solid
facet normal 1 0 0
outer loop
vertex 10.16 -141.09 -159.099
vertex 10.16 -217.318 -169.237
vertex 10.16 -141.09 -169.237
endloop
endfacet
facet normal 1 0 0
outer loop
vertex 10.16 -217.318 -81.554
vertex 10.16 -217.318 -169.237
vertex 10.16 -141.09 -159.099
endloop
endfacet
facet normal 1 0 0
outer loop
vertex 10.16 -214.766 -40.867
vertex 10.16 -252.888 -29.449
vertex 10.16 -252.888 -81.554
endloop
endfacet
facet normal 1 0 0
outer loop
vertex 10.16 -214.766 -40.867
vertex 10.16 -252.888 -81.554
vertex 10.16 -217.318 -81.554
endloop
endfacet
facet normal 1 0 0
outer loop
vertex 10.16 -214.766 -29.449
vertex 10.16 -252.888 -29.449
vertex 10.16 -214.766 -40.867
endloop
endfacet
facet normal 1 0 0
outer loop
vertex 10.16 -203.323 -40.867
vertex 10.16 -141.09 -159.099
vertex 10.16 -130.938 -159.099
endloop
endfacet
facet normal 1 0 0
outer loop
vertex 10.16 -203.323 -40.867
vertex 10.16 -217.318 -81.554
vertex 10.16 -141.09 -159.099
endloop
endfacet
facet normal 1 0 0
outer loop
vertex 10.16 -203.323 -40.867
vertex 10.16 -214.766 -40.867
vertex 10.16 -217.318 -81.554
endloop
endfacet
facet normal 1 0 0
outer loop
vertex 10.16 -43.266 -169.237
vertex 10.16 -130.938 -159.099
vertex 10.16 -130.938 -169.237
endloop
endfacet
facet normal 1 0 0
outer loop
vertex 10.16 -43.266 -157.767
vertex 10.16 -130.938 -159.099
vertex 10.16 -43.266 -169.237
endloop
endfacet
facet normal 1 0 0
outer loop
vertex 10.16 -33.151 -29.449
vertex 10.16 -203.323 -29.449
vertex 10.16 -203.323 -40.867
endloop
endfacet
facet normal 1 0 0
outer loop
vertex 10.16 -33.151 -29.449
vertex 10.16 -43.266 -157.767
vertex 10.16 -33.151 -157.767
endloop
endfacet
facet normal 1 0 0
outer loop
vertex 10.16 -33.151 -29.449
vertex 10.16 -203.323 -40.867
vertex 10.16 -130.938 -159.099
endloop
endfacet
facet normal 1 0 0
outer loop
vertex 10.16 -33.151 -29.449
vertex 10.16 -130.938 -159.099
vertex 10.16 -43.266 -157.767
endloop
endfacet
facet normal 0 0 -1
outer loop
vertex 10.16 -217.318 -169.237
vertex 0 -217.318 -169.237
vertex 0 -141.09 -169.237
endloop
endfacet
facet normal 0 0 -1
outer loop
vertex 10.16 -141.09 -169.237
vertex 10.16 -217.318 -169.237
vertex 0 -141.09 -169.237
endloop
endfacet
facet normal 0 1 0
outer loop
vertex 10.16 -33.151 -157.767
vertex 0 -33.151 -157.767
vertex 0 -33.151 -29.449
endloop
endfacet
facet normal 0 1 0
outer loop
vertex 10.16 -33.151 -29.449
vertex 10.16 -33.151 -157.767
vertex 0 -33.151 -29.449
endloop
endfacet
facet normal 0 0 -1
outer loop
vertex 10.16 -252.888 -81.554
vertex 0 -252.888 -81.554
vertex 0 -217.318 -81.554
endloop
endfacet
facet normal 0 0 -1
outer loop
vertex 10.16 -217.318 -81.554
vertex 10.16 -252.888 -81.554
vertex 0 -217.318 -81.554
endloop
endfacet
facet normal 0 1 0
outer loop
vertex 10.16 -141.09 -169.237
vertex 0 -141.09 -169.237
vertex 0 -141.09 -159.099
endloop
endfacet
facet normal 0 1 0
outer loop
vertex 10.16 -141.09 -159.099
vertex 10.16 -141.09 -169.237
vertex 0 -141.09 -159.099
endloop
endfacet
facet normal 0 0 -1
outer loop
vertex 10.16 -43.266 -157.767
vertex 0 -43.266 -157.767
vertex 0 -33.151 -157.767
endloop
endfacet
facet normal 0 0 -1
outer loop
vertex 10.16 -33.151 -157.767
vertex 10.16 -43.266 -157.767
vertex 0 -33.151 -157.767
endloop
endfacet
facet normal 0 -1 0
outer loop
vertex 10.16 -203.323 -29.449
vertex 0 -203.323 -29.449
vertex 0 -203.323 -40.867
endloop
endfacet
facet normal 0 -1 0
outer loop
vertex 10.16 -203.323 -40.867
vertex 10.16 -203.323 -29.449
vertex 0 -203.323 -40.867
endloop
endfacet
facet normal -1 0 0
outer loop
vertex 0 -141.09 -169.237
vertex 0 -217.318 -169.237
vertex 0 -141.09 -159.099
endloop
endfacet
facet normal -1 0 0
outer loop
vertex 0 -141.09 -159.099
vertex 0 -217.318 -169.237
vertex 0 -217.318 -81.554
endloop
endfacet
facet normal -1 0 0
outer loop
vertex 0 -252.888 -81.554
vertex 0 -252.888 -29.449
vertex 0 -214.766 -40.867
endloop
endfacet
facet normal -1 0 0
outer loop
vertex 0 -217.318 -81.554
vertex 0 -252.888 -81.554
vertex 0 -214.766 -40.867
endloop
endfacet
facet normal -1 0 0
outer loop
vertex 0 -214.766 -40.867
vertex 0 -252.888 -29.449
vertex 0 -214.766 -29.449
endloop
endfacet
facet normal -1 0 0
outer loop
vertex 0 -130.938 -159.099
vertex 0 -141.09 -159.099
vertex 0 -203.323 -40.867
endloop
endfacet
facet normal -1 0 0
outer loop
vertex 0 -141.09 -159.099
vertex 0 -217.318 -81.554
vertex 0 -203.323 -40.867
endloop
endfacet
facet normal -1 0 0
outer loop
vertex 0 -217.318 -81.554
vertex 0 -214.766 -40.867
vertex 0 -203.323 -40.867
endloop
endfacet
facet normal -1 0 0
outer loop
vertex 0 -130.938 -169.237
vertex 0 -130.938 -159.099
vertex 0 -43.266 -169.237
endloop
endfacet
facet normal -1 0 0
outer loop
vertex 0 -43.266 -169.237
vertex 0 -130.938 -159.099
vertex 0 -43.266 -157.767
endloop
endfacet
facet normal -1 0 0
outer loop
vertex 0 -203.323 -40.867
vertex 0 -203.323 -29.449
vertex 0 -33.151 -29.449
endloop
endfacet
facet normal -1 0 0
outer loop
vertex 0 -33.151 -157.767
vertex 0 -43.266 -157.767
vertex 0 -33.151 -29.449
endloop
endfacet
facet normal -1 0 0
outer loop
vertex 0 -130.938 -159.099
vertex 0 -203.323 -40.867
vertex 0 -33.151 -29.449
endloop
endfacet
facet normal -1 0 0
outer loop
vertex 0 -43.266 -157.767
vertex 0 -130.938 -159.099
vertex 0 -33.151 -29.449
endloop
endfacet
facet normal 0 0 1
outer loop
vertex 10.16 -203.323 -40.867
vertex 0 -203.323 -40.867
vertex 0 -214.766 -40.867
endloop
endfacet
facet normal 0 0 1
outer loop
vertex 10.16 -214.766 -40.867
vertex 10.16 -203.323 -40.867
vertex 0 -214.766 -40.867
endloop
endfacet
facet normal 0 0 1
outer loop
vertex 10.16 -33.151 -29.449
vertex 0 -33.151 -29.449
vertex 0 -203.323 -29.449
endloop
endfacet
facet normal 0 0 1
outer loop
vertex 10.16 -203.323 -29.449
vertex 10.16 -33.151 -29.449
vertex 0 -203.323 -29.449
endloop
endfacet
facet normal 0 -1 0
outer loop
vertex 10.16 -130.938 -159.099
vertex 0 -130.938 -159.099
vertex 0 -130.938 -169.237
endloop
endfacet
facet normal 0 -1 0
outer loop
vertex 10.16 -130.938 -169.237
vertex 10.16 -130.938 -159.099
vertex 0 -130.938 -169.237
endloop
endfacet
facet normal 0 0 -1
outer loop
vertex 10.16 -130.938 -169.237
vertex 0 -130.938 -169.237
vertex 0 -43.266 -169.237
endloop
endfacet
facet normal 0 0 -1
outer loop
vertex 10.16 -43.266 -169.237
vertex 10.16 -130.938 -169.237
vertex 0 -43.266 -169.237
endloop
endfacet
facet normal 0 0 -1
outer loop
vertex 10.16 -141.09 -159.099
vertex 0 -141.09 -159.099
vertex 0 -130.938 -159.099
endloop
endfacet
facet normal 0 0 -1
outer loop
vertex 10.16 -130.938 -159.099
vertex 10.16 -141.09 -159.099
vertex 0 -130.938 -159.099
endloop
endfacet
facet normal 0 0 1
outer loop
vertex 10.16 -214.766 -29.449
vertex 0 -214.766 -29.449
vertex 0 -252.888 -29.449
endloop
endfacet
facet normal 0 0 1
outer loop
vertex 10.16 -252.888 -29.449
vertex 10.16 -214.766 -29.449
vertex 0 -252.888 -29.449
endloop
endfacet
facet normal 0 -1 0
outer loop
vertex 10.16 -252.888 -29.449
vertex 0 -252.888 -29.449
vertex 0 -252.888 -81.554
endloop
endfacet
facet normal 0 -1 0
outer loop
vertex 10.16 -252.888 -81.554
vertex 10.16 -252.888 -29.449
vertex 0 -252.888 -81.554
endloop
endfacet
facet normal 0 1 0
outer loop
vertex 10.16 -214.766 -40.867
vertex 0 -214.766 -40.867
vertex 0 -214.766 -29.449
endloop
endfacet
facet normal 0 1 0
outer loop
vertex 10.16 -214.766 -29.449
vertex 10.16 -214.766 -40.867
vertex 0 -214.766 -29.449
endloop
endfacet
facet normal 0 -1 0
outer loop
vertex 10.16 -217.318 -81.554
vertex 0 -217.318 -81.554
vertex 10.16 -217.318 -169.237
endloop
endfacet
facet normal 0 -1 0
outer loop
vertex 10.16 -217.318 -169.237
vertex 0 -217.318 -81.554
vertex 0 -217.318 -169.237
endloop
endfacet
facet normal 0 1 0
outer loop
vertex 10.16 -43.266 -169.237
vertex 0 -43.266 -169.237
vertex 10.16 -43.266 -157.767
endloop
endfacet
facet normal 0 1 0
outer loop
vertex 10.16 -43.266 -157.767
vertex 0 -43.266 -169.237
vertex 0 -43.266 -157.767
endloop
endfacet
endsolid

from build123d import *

# Parameters (mm, degrees)
F1_DEPTH = 10.16


with BuildPart() as f1:
    # F0 (on Right) → F1 (new body)
    with BuildSketch(Plane.YZ):
        Polygon((-33.151075, -29.448999), (-43.265525, -29.448999), (-203.323364, -29.448999), (-203.323364, -40.867418), (-214.765817, -40.867418), (-214.765817, -29.448999), (-252.887964, -29.448999), (-252.887964, -81.55378), (-217.317522, -81.55378), (-217.317522, -169.236988), (-141.089514, -169.236988), (-141.089514, -159.098729), (-130.937725, -159.098729), (-130.937725, -169.236988), (-43.265525, -169.236988), (-43.265525, -157.767057), (-33.151075, -157.767057), align=None)
    extrude(amount=F1_DEPTH)


solid = f1.part
